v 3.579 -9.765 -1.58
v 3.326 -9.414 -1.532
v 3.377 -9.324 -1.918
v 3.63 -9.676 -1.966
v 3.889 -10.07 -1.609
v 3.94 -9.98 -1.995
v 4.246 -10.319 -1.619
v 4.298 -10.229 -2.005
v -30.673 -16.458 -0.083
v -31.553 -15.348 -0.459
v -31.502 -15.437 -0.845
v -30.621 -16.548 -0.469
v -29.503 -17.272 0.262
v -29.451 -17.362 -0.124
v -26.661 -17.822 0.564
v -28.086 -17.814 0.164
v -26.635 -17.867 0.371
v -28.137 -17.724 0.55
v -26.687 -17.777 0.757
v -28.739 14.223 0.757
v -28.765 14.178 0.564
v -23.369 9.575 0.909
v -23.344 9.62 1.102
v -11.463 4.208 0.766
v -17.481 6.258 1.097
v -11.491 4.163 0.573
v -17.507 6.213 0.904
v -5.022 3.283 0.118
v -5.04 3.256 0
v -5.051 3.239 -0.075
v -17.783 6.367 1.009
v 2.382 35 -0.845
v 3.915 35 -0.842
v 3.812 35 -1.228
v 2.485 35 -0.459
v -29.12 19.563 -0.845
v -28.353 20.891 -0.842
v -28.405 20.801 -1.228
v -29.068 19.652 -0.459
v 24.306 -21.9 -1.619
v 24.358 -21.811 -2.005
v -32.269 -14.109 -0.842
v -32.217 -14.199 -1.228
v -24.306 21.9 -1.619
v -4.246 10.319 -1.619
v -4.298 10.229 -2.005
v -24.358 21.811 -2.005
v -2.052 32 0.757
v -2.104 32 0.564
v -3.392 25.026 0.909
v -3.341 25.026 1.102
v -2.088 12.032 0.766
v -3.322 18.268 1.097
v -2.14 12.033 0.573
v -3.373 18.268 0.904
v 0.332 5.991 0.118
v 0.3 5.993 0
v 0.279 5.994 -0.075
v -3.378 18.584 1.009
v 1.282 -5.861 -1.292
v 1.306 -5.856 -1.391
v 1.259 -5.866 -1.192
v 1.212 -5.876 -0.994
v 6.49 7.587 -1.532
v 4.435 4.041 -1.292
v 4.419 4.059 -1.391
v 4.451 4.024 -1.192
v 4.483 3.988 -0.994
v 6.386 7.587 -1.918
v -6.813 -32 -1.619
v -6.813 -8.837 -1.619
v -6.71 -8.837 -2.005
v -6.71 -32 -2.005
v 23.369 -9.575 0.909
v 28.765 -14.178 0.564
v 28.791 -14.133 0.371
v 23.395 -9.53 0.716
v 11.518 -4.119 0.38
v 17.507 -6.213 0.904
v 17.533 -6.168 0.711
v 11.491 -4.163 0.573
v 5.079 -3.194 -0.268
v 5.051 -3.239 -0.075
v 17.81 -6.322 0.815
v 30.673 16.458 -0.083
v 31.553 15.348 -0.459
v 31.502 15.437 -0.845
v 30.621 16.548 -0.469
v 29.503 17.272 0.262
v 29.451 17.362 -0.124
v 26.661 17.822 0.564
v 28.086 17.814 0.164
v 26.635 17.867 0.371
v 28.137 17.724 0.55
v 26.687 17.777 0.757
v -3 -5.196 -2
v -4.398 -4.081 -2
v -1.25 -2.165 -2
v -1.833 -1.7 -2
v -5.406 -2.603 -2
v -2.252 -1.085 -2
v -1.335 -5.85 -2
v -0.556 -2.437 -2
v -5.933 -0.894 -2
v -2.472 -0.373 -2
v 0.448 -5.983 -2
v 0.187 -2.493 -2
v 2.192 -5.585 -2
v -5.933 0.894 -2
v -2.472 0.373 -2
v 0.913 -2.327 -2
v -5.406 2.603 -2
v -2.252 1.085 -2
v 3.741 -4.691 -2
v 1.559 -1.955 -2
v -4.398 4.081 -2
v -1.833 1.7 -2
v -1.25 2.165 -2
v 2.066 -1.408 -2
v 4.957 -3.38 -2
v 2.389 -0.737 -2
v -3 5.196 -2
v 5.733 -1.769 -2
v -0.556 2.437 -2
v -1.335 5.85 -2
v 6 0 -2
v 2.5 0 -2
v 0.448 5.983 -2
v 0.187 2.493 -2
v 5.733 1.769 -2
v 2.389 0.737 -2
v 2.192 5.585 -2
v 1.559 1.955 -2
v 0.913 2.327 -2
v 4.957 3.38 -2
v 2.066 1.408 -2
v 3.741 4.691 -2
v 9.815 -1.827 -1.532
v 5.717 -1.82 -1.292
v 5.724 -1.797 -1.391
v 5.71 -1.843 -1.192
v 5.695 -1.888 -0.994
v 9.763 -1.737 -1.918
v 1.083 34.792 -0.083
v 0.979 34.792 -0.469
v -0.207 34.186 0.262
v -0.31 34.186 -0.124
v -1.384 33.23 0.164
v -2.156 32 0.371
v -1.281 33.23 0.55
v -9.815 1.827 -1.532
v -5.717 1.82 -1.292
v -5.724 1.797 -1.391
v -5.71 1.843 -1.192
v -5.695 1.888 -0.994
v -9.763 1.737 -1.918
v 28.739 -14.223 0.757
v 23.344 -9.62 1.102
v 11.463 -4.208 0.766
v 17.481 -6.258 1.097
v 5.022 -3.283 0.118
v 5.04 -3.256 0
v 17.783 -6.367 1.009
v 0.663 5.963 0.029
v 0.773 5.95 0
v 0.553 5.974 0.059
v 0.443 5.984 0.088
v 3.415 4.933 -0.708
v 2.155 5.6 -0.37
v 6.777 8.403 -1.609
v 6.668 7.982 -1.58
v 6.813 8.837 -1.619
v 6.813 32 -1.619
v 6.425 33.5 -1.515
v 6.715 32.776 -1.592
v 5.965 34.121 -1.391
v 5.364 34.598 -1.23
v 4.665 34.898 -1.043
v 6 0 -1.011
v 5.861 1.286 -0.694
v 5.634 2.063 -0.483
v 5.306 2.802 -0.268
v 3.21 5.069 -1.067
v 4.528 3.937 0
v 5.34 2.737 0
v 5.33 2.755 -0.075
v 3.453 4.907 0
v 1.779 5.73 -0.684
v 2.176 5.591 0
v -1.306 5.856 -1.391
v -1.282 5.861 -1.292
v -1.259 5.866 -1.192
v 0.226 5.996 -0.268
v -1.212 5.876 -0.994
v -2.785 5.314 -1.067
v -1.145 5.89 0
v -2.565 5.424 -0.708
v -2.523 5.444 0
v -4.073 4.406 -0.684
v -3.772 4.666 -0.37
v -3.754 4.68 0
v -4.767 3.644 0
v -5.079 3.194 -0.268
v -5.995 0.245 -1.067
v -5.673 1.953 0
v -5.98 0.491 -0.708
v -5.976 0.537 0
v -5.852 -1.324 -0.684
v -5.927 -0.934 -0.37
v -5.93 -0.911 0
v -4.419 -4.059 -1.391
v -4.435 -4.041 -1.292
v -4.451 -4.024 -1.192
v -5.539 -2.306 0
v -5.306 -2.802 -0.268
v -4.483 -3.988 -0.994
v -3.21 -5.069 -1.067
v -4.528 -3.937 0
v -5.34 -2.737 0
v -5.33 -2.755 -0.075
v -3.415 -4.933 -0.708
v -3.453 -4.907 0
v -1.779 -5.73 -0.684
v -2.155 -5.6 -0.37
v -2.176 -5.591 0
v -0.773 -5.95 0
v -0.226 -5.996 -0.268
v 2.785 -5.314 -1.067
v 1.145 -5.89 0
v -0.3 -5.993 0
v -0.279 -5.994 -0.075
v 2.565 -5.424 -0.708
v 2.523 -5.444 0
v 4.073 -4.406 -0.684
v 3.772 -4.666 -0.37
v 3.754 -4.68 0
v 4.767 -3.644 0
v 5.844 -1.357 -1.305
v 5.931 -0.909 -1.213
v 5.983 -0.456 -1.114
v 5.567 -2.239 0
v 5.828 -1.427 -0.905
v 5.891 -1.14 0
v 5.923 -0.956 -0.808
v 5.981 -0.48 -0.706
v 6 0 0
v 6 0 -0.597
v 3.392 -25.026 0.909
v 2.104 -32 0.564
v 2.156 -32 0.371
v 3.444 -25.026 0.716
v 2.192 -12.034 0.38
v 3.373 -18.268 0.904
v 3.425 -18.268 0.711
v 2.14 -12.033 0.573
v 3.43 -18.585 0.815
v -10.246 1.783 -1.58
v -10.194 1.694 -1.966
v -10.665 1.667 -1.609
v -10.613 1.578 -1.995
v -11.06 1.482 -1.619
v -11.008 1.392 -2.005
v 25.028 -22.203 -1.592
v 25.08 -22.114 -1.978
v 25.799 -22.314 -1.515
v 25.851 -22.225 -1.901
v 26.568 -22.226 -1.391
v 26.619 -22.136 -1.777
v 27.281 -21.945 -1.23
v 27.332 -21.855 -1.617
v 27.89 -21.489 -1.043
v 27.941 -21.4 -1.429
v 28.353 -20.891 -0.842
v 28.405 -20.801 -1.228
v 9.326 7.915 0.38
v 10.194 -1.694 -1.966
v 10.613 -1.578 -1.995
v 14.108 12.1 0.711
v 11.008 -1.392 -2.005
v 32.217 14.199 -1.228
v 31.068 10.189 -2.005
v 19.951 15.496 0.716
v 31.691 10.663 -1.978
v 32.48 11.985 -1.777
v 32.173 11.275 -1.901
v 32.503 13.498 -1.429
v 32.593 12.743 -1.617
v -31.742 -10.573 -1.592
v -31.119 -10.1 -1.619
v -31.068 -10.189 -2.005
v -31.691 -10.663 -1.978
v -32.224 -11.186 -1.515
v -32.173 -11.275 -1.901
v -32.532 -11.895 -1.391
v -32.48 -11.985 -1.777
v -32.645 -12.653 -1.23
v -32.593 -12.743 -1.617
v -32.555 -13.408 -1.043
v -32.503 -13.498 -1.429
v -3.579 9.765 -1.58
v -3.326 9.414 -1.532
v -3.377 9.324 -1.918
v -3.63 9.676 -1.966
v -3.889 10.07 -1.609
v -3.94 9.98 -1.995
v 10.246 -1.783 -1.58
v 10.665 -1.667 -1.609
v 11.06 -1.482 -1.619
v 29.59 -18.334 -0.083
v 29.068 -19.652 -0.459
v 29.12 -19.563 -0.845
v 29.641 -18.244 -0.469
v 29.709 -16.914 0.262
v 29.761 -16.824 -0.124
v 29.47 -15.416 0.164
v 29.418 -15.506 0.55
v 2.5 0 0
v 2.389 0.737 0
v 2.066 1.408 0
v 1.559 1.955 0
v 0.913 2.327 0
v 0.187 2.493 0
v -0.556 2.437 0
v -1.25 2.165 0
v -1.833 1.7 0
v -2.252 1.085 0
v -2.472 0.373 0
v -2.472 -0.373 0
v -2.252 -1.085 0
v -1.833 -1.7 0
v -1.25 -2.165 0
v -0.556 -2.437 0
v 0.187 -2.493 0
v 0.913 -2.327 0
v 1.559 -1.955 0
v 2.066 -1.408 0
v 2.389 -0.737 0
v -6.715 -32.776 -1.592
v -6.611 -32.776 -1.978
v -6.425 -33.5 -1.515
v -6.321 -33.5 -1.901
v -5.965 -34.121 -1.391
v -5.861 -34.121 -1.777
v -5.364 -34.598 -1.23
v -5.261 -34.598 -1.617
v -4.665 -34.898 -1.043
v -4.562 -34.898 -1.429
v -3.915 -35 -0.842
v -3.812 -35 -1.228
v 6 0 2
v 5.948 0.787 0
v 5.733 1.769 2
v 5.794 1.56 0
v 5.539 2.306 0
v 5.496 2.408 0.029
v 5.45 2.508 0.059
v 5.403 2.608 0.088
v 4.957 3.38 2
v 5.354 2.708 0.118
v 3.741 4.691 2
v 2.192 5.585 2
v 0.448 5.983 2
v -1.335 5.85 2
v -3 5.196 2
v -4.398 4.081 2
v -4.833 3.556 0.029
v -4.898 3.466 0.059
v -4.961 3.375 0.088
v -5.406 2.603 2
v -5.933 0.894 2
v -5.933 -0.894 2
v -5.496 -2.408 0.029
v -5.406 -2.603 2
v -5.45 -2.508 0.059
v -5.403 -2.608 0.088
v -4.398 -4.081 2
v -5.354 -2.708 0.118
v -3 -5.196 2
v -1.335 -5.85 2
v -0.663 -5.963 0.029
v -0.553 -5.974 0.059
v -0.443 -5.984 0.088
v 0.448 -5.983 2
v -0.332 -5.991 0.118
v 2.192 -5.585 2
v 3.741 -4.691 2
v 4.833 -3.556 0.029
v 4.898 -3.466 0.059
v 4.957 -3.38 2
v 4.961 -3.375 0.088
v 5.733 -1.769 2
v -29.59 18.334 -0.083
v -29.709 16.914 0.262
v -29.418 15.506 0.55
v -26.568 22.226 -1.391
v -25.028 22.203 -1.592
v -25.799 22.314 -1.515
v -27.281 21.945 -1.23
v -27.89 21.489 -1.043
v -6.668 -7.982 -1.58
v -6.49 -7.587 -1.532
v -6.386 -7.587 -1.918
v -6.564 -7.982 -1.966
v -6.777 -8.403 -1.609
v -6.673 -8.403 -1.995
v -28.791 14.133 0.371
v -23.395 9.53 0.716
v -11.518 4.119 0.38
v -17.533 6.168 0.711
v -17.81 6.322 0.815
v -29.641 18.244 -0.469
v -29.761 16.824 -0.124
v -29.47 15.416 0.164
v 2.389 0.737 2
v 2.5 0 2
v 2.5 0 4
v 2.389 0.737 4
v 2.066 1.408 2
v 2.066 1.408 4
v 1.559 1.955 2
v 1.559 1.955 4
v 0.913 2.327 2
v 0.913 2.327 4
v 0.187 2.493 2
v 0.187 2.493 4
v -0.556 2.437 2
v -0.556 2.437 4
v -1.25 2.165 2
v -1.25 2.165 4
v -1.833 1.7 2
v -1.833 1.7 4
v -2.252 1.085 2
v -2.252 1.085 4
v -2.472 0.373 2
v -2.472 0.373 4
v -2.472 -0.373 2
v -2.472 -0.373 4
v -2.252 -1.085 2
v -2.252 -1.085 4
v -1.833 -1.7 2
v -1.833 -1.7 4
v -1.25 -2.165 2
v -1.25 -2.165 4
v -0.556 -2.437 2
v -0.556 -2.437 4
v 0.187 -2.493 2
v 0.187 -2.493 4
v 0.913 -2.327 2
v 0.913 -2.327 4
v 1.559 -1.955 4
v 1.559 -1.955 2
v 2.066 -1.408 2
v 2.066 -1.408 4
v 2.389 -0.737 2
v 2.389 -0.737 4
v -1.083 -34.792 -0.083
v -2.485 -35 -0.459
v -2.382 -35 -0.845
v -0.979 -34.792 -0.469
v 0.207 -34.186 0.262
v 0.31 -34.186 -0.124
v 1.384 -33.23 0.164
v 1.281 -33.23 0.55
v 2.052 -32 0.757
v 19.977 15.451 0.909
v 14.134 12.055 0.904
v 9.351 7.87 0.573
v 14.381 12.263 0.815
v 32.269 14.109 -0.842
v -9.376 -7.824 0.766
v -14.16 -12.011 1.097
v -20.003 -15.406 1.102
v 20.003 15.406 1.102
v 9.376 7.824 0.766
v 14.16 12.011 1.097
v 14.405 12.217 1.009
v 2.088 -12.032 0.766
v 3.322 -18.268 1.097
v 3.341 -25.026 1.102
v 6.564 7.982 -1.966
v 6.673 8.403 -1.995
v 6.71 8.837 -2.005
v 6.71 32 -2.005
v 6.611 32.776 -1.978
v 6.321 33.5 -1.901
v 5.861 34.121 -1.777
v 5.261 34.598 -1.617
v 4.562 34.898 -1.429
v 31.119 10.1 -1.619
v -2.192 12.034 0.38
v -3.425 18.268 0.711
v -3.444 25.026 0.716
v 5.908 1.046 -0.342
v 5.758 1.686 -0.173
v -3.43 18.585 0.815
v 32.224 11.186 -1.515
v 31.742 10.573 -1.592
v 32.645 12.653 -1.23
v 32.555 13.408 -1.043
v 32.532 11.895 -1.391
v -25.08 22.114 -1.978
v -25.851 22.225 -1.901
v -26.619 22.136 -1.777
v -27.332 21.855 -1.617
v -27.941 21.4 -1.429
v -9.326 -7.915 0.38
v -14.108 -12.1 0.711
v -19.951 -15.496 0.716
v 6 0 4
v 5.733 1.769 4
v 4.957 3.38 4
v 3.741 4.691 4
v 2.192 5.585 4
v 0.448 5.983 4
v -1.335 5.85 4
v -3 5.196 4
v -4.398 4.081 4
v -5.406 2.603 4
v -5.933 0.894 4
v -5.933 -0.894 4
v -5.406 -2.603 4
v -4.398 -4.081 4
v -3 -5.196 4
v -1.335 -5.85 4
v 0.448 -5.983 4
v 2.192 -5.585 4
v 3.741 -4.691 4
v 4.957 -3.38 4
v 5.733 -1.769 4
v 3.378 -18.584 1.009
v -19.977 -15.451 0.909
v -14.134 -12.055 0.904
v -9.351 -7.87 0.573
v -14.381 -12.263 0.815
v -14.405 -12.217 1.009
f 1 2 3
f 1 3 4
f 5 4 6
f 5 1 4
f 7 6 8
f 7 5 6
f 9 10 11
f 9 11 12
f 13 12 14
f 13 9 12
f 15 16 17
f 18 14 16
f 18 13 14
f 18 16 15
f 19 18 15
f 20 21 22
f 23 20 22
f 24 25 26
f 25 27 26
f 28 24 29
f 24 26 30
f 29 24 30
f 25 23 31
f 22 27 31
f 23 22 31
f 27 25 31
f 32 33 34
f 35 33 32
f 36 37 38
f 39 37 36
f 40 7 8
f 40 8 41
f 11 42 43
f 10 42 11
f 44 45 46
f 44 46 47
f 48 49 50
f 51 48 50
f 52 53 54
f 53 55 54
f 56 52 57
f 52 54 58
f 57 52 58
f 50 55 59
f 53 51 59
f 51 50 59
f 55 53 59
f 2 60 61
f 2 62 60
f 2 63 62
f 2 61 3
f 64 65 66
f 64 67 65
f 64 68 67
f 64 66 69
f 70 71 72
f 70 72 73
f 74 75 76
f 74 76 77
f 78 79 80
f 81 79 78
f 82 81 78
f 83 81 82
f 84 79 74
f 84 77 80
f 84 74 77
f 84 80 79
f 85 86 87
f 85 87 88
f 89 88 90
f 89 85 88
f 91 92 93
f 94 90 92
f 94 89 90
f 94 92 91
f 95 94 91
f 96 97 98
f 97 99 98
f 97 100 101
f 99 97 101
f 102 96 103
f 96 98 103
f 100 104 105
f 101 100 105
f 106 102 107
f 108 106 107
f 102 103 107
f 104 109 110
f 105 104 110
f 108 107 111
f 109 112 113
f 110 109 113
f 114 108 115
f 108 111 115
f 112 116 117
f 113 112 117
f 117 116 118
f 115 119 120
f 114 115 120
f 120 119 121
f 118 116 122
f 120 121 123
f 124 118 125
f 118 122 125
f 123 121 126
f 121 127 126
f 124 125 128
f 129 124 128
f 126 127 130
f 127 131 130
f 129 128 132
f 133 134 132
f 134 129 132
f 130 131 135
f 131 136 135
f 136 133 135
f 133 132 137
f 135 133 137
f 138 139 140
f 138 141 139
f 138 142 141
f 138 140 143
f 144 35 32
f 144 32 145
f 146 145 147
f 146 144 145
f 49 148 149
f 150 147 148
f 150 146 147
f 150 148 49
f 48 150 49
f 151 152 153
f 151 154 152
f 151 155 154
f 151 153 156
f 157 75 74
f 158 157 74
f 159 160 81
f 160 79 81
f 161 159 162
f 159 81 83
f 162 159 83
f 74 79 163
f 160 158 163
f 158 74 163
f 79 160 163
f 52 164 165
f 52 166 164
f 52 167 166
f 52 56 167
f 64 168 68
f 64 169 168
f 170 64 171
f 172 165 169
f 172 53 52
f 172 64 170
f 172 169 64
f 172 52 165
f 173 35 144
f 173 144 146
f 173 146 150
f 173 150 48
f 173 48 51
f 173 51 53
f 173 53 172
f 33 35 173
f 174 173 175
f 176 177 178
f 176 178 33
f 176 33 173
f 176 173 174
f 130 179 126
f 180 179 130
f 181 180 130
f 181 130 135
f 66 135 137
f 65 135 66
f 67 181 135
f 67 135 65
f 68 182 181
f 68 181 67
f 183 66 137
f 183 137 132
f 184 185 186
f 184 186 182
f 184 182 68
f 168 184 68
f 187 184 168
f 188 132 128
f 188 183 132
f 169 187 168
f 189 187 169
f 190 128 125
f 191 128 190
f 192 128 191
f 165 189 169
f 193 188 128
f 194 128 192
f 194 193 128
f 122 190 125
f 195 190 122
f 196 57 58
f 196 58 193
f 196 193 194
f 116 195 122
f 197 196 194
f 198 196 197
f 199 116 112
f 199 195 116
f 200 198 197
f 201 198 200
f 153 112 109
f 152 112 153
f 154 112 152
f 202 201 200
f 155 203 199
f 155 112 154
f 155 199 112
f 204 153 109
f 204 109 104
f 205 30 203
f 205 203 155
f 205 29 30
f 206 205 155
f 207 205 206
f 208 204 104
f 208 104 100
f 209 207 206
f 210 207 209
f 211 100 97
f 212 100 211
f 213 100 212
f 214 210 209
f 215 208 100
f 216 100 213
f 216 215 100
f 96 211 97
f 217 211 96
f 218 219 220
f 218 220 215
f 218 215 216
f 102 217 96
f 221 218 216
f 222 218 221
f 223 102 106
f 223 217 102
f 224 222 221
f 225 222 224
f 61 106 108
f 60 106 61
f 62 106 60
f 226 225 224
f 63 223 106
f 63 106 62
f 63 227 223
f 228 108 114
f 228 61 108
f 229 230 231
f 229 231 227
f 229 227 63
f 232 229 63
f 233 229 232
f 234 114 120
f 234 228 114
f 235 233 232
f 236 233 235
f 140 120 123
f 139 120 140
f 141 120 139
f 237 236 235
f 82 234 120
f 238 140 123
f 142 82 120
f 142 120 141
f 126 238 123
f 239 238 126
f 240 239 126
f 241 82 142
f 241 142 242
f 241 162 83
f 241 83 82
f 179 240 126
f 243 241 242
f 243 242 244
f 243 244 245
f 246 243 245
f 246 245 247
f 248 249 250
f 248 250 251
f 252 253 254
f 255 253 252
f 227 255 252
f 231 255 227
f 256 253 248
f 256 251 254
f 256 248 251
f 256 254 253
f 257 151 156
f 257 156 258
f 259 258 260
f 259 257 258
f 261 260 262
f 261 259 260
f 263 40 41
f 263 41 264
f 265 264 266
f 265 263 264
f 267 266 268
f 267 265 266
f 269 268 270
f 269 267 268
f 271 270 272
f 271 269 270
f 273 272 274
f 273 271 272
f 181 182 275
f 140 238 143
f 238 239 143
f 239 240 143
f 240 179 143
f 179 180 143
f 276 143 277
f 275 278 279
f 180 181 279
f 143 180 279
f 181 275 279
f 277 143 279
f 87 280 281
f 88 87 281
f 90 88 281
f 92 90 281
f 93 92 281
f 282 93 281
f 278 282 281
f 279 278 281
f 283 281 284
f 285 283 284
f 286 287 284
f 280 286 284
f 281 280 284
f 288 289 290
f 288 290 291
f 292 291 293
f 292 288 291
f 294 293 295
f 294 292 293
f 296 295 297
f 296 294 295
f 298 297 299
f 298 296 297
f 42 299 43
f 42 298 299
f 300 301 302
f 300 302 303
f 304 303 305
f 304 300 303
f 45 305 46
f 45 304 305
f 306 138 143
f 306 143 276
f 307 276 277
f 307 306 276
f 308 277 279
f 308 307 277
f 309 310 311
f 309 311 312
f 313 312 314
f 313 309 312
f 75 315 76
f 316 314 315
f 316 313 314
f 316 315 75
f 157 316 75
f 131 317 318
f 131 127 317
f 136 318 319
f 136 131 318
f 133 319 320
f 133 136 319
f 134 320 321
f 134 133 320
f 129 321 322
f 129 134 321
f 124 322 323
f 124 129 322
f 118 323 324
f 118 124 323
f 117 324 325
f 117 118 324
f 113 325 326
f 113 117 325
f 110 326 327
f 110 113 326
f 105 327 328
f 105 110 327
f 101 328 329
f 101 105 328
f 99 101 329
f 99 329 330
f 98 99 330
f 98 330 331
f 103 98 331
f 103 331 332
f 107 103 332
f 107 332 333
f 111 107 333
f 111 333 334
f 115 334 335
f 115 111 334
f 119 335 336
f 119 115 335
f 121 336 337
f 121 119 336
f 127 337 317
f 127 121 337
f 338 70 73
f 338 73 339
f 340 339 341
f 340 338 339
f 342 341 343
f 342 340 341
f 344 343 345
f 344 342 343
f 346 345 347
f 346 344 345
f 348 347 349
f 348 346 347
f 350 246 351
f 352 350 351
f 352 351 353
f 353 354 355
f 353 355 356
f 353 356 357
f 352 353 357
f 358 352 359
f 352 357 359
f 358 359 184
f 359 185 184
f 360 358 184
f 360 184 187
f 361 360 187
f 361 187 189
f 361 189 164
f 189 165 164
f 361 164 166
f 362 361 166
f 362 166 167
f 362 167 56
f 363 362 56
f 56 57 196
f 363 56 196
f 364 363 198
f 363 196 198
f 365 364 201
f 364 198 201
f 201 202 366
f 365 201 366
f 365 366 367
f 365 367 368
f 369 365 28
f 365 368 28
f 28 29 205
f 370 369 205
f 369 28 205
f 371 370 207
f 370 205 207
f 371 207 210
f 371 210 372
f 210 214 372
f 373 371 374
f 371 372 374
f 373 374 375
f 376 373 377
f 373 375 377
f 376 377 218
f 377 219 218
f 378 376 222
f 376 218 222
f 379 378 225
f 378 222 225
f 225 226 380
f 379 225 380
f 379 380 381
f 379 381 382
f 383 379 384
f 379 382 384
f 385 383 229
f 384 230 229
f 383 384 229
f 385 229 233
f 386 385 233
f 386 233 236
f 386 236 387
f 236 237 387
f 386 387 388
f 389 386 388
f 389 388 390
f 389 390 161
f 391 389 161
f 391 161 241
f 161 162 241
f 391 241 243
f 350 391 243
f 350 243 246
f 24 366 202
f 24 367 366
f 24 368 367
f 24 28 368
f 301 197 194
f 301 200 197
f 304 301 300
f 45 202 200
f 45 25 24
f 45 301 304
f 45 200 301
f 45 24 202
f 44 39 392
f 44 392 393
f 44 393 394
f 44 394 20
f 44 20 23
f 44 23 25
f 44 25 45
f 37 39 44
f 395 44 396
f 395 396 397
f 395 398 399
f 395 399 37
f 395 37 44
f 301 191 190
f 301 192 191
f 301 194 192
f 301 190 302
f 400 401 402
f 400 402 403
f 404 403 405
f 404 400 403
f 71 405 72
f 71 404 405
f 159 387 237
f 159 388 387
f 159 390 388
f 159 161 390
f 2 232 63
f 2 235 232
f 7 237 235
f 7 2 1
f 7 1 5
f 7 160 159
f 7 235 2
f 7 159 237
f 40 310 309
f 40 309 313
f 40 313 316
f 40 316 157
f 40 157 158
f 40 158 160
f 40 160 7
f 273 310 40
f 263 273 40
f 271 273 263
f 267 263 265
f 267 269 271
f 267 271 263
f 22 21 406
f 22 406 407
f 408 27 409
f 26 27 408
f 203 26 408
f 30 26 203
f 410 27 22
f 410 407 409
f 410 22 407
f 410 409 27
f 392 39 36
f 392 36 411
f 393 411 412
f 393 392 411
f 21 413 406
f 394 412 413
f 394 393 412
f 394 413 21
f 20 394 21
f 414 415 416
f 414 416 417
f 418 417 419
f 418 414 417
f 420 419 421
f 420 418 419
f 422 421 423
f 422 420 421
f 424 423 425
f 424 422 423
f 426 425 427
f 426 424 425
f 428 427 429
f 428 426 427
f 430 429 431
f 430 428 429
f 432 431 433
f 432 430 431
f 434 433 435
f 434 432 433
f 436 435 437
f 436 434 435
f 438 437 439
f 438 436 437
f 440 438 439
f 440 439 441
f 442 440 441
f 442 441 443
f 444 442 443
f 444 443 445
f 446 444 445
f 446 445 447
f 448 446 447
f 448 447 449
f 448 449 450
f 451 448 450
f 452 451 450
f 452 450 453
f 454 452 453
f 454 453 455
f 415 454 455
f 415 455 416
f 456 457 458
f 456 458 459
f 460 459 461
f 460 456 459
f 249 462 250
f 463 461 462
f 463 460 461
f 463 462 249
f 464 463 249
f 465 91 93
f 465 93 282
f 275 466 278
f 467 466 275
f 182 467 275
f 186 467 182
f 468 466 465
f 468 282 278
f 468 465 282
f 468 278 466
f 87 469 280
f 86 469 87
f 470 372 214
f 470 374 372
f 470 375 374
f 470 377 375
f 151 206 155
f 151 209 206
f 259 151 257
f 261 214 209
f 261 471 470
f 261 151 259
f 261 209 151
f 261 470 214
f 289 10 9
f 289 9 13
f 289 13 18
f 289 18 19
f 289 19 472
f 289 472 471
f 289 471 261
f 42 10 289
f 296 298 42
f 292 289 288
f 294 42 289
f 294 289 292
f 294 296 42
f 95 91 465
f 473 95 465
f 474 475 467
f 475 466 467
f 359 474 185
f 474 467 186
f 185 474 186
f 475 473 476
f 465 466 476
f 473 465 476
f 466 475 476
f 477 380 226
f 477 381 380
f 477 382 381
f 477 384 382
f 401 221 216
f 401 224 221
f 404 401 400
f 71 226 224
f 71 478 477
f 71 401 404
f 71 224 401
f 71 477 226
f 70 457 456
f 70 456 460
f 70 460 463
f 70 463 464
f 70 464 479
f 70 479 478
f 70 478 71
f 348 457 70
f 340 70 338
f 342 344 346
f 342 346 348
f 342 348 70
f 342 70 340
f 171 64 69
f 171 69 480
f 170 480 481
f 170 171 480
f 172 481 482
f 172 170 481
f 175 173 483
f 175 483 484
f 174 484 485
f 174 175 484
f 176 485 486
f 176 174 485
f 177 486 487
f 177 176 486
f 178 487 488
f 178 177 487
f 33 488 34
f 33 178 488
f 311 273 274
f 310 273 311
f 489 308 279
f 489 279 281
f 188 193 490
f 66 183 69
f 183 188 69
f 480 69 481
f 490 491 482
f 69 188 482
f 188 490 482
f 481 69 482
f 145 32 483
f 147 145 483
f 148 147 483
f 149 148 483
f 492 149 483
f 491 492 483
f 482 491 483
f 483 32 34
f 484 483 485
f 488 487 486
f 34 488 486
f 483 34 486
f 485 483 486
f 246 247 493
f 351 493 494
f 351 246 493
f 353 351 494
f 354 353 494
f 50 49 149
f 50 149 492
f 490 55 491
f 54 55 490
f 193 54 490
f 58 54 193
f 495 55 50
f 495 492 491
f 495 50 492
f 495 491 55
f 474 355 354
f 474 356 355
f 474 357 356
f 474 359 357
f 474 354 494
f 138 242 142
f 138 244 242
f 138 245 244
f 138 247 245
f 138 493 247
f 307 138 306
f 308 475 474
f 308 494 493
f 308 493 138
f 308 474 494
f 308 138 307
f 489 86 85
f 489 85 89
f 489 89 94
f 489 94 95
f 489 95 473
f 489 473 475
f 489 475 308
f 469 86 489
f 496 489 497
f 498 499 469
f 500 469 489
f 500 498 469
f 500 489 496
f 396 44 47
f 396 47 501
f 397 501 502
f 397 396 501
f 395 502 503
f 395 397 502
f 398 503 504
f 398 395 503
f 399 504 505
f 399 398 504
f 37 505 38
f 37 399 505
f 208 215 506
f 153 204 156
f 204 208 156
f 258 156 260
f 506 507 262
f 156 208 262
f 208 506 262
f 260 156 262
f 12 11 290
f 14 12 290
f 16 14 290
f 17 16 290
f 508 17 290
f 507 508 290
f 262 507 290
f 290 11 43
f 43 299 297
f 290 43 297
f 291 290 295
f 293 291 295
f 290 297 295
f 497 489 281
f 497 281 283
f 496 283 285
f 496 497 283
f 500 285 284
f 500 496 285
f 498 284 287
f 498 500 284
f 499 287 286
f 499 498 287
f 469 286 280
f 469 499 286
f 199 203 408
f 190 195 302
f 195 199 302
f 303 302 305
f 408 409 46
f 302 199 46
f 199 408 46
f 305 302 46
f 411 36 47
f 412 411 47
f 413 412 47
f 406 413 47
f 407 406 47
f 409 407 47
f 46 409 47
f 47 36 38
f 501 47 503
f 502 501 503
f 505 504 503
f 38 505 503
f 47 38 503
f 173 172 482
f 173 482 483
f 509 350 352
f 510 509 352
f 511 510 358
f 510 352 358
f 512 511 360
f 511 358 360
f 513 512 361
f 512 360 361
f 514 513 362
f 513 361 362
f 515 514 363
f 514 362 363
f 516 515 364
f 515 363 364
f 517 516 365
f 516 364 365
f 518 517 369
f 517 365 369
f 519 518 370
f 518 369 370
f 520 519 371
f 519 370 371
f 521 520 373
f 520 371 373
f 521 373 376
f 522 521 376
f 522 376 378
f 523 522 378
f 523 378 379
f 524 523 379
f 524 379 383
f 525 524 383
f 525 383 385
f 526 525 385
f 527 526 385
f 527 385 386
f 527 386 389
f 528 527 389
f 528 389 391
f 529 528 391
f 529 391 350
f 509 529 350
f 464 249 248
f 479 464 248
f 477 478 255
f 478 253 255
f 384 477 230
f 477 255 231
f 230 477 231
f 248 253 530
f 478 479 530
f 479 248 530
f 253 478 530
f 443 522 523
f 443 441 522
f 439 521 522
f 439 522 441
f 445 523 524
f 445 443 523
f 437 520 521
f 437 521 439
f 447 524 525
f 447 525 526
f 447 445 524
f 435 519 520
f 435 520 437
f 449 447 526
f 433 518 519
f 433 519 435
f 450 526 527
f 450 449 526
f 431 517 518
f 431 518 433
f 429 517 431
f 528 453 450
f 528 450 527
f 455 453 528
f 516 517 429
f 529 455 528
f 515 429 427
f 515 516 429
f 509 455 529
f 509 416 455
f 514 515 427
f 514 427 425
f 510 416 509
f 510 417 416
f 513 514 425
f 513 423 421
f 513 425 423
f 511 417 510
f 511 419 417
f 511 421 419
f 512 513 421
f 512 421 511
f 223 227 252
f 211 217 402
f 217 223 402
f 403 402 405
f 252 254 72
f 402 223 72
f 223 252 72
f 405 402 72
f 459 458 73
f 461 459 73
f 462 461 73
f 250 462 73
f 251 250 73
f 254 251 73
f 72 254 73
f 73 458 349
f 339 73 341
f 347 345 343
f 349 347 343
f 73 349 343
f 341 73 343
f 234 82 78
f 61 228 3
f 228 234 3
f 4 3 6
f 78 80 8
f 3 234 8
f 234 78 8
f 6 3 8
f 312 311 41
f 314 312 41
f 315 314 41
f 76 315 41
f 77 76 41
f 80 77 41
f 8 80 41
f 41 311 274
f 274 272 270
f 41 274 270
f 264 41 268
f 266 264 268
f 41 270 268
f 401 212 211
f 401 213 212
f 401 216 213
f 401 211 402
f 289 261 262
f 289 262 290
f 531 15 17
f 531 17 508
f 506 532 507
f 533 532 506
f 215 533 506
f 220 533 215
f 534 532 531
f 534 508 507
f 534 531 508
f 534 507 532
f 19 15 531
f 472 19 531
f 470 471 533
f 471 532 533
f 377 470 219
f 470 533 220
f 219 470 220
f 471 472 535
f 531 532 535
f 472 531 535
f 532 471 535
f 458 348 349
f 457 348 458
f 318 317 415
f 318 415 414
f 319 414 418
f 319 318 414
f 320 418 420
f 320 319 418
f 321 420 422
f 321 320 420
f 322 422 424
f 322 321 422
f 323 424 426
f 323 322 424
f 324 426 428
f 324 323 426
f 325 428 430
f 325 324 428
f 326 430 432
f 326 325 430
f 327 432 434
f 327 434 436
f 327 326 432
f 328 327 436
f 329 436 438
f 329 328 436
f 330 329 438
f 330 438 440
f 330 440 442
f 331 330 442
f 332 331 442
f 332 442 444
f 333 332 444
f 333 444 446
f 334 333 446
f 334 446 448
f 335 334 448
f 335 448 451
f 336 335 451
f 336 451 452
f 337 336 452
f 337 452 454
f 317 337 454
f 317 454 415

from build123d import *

# Parameters (mm, degrees)
SKETCH_2_R               = 6
SKETCH_2_R_2             = 2.5
EXTRUDE_1_DEPTH          = 4
EXTRUDE_2_DEPTH          = 0.2
SKETCH_2_5_R             = 6
SKETCH_2_5_R_2           = 2.5
EXTRUDE_6_DEPTH          = 2
PATTERN_CIRCULAR_1_COUNT = 6


with BuildPart() as part:
    # 草图2 → 凸台-拉伸1 (new body)
    with BuildSketch(Plane.XY):
        Circle(SKETCH_2_R)
        Circle(SKETCH_2_R_2, mode=Mode.SUBTRACT)
    extrude(amount=EXTRUDE_1_DEPTH)

    # 草图6 → 凸台-拉伸2 (add, symmetric)
    with BuildSketch(Plane(origin=(0, 0, 0), x_dir=(0.9659258262890681, 0, -0.2588190451025218), z_dir=(0.2588190451025218, 0, 0.9659258262890681))):
        with BuildLine():
            Line((4, 2.970800909), (6.665063509, 7.586826313))
            ThreePointArc((6.665063509, 7.586826313), (6.914814566, 8.1897787), (7, 8.836826313))
            Line((7, 8.836826313), (7, 32))
            ThreePointArc((7, 32), (6.121320344, 34.121320344), (4, 35))
            Line((4, 35), (2.519223828, 35))
            ThreePointArc((2.519223828, 35), (-0.267681994, 34.186020016), (-2.178368771, 32))
            add(Edge.make_bspline(
                [(-2.178368771, 32), (-6.131576328, 18.074358524), (0.381779744, 5.817884597)],
                knots=[0, 0, 0, 1, 1, 1], degree=2))
            add(Edge.make_bspline(
                [(4, 2.970800909), (2.776948837, 5.192610395), (0.381779744, 5.817884597)],
                knots=[5.230377445, 5.230377445, 5.230377445, 6.036173694, 6.036173694, 6.036173694], degree=2, weights=[1, 0.919928545, 1]))
        make_face()
    extrude_2 = extrude(amount=EXTRUDE_2_DEPTH, both=True)

    # 草图2<5> → 凸台-拉伸6 (add, symmetric)
    with BuildSketch(Plane.XY):
        Circle(SKETCH_2_5_R)
        Circle(SKETCH_2_5_R_2, mode=Mode.SUBTRACT)
    extrude(amount=EXTRUDE_6_DEPTH, both=True)

    # 阵列(圆周)1: 凸台-拉伸2 ×6 about axis
    pattern_circular_1_axis = Axis((0, 0, 4), (0, 0, -1))
    for i in range(1, PATTERN_CIRCULAR_1_COUNT):
        add(extrude_2.rotate(pattern_circular_1_axis, i * 360 / PATTERN_CIRCULAR_1_COUNT))


solid = part.part
